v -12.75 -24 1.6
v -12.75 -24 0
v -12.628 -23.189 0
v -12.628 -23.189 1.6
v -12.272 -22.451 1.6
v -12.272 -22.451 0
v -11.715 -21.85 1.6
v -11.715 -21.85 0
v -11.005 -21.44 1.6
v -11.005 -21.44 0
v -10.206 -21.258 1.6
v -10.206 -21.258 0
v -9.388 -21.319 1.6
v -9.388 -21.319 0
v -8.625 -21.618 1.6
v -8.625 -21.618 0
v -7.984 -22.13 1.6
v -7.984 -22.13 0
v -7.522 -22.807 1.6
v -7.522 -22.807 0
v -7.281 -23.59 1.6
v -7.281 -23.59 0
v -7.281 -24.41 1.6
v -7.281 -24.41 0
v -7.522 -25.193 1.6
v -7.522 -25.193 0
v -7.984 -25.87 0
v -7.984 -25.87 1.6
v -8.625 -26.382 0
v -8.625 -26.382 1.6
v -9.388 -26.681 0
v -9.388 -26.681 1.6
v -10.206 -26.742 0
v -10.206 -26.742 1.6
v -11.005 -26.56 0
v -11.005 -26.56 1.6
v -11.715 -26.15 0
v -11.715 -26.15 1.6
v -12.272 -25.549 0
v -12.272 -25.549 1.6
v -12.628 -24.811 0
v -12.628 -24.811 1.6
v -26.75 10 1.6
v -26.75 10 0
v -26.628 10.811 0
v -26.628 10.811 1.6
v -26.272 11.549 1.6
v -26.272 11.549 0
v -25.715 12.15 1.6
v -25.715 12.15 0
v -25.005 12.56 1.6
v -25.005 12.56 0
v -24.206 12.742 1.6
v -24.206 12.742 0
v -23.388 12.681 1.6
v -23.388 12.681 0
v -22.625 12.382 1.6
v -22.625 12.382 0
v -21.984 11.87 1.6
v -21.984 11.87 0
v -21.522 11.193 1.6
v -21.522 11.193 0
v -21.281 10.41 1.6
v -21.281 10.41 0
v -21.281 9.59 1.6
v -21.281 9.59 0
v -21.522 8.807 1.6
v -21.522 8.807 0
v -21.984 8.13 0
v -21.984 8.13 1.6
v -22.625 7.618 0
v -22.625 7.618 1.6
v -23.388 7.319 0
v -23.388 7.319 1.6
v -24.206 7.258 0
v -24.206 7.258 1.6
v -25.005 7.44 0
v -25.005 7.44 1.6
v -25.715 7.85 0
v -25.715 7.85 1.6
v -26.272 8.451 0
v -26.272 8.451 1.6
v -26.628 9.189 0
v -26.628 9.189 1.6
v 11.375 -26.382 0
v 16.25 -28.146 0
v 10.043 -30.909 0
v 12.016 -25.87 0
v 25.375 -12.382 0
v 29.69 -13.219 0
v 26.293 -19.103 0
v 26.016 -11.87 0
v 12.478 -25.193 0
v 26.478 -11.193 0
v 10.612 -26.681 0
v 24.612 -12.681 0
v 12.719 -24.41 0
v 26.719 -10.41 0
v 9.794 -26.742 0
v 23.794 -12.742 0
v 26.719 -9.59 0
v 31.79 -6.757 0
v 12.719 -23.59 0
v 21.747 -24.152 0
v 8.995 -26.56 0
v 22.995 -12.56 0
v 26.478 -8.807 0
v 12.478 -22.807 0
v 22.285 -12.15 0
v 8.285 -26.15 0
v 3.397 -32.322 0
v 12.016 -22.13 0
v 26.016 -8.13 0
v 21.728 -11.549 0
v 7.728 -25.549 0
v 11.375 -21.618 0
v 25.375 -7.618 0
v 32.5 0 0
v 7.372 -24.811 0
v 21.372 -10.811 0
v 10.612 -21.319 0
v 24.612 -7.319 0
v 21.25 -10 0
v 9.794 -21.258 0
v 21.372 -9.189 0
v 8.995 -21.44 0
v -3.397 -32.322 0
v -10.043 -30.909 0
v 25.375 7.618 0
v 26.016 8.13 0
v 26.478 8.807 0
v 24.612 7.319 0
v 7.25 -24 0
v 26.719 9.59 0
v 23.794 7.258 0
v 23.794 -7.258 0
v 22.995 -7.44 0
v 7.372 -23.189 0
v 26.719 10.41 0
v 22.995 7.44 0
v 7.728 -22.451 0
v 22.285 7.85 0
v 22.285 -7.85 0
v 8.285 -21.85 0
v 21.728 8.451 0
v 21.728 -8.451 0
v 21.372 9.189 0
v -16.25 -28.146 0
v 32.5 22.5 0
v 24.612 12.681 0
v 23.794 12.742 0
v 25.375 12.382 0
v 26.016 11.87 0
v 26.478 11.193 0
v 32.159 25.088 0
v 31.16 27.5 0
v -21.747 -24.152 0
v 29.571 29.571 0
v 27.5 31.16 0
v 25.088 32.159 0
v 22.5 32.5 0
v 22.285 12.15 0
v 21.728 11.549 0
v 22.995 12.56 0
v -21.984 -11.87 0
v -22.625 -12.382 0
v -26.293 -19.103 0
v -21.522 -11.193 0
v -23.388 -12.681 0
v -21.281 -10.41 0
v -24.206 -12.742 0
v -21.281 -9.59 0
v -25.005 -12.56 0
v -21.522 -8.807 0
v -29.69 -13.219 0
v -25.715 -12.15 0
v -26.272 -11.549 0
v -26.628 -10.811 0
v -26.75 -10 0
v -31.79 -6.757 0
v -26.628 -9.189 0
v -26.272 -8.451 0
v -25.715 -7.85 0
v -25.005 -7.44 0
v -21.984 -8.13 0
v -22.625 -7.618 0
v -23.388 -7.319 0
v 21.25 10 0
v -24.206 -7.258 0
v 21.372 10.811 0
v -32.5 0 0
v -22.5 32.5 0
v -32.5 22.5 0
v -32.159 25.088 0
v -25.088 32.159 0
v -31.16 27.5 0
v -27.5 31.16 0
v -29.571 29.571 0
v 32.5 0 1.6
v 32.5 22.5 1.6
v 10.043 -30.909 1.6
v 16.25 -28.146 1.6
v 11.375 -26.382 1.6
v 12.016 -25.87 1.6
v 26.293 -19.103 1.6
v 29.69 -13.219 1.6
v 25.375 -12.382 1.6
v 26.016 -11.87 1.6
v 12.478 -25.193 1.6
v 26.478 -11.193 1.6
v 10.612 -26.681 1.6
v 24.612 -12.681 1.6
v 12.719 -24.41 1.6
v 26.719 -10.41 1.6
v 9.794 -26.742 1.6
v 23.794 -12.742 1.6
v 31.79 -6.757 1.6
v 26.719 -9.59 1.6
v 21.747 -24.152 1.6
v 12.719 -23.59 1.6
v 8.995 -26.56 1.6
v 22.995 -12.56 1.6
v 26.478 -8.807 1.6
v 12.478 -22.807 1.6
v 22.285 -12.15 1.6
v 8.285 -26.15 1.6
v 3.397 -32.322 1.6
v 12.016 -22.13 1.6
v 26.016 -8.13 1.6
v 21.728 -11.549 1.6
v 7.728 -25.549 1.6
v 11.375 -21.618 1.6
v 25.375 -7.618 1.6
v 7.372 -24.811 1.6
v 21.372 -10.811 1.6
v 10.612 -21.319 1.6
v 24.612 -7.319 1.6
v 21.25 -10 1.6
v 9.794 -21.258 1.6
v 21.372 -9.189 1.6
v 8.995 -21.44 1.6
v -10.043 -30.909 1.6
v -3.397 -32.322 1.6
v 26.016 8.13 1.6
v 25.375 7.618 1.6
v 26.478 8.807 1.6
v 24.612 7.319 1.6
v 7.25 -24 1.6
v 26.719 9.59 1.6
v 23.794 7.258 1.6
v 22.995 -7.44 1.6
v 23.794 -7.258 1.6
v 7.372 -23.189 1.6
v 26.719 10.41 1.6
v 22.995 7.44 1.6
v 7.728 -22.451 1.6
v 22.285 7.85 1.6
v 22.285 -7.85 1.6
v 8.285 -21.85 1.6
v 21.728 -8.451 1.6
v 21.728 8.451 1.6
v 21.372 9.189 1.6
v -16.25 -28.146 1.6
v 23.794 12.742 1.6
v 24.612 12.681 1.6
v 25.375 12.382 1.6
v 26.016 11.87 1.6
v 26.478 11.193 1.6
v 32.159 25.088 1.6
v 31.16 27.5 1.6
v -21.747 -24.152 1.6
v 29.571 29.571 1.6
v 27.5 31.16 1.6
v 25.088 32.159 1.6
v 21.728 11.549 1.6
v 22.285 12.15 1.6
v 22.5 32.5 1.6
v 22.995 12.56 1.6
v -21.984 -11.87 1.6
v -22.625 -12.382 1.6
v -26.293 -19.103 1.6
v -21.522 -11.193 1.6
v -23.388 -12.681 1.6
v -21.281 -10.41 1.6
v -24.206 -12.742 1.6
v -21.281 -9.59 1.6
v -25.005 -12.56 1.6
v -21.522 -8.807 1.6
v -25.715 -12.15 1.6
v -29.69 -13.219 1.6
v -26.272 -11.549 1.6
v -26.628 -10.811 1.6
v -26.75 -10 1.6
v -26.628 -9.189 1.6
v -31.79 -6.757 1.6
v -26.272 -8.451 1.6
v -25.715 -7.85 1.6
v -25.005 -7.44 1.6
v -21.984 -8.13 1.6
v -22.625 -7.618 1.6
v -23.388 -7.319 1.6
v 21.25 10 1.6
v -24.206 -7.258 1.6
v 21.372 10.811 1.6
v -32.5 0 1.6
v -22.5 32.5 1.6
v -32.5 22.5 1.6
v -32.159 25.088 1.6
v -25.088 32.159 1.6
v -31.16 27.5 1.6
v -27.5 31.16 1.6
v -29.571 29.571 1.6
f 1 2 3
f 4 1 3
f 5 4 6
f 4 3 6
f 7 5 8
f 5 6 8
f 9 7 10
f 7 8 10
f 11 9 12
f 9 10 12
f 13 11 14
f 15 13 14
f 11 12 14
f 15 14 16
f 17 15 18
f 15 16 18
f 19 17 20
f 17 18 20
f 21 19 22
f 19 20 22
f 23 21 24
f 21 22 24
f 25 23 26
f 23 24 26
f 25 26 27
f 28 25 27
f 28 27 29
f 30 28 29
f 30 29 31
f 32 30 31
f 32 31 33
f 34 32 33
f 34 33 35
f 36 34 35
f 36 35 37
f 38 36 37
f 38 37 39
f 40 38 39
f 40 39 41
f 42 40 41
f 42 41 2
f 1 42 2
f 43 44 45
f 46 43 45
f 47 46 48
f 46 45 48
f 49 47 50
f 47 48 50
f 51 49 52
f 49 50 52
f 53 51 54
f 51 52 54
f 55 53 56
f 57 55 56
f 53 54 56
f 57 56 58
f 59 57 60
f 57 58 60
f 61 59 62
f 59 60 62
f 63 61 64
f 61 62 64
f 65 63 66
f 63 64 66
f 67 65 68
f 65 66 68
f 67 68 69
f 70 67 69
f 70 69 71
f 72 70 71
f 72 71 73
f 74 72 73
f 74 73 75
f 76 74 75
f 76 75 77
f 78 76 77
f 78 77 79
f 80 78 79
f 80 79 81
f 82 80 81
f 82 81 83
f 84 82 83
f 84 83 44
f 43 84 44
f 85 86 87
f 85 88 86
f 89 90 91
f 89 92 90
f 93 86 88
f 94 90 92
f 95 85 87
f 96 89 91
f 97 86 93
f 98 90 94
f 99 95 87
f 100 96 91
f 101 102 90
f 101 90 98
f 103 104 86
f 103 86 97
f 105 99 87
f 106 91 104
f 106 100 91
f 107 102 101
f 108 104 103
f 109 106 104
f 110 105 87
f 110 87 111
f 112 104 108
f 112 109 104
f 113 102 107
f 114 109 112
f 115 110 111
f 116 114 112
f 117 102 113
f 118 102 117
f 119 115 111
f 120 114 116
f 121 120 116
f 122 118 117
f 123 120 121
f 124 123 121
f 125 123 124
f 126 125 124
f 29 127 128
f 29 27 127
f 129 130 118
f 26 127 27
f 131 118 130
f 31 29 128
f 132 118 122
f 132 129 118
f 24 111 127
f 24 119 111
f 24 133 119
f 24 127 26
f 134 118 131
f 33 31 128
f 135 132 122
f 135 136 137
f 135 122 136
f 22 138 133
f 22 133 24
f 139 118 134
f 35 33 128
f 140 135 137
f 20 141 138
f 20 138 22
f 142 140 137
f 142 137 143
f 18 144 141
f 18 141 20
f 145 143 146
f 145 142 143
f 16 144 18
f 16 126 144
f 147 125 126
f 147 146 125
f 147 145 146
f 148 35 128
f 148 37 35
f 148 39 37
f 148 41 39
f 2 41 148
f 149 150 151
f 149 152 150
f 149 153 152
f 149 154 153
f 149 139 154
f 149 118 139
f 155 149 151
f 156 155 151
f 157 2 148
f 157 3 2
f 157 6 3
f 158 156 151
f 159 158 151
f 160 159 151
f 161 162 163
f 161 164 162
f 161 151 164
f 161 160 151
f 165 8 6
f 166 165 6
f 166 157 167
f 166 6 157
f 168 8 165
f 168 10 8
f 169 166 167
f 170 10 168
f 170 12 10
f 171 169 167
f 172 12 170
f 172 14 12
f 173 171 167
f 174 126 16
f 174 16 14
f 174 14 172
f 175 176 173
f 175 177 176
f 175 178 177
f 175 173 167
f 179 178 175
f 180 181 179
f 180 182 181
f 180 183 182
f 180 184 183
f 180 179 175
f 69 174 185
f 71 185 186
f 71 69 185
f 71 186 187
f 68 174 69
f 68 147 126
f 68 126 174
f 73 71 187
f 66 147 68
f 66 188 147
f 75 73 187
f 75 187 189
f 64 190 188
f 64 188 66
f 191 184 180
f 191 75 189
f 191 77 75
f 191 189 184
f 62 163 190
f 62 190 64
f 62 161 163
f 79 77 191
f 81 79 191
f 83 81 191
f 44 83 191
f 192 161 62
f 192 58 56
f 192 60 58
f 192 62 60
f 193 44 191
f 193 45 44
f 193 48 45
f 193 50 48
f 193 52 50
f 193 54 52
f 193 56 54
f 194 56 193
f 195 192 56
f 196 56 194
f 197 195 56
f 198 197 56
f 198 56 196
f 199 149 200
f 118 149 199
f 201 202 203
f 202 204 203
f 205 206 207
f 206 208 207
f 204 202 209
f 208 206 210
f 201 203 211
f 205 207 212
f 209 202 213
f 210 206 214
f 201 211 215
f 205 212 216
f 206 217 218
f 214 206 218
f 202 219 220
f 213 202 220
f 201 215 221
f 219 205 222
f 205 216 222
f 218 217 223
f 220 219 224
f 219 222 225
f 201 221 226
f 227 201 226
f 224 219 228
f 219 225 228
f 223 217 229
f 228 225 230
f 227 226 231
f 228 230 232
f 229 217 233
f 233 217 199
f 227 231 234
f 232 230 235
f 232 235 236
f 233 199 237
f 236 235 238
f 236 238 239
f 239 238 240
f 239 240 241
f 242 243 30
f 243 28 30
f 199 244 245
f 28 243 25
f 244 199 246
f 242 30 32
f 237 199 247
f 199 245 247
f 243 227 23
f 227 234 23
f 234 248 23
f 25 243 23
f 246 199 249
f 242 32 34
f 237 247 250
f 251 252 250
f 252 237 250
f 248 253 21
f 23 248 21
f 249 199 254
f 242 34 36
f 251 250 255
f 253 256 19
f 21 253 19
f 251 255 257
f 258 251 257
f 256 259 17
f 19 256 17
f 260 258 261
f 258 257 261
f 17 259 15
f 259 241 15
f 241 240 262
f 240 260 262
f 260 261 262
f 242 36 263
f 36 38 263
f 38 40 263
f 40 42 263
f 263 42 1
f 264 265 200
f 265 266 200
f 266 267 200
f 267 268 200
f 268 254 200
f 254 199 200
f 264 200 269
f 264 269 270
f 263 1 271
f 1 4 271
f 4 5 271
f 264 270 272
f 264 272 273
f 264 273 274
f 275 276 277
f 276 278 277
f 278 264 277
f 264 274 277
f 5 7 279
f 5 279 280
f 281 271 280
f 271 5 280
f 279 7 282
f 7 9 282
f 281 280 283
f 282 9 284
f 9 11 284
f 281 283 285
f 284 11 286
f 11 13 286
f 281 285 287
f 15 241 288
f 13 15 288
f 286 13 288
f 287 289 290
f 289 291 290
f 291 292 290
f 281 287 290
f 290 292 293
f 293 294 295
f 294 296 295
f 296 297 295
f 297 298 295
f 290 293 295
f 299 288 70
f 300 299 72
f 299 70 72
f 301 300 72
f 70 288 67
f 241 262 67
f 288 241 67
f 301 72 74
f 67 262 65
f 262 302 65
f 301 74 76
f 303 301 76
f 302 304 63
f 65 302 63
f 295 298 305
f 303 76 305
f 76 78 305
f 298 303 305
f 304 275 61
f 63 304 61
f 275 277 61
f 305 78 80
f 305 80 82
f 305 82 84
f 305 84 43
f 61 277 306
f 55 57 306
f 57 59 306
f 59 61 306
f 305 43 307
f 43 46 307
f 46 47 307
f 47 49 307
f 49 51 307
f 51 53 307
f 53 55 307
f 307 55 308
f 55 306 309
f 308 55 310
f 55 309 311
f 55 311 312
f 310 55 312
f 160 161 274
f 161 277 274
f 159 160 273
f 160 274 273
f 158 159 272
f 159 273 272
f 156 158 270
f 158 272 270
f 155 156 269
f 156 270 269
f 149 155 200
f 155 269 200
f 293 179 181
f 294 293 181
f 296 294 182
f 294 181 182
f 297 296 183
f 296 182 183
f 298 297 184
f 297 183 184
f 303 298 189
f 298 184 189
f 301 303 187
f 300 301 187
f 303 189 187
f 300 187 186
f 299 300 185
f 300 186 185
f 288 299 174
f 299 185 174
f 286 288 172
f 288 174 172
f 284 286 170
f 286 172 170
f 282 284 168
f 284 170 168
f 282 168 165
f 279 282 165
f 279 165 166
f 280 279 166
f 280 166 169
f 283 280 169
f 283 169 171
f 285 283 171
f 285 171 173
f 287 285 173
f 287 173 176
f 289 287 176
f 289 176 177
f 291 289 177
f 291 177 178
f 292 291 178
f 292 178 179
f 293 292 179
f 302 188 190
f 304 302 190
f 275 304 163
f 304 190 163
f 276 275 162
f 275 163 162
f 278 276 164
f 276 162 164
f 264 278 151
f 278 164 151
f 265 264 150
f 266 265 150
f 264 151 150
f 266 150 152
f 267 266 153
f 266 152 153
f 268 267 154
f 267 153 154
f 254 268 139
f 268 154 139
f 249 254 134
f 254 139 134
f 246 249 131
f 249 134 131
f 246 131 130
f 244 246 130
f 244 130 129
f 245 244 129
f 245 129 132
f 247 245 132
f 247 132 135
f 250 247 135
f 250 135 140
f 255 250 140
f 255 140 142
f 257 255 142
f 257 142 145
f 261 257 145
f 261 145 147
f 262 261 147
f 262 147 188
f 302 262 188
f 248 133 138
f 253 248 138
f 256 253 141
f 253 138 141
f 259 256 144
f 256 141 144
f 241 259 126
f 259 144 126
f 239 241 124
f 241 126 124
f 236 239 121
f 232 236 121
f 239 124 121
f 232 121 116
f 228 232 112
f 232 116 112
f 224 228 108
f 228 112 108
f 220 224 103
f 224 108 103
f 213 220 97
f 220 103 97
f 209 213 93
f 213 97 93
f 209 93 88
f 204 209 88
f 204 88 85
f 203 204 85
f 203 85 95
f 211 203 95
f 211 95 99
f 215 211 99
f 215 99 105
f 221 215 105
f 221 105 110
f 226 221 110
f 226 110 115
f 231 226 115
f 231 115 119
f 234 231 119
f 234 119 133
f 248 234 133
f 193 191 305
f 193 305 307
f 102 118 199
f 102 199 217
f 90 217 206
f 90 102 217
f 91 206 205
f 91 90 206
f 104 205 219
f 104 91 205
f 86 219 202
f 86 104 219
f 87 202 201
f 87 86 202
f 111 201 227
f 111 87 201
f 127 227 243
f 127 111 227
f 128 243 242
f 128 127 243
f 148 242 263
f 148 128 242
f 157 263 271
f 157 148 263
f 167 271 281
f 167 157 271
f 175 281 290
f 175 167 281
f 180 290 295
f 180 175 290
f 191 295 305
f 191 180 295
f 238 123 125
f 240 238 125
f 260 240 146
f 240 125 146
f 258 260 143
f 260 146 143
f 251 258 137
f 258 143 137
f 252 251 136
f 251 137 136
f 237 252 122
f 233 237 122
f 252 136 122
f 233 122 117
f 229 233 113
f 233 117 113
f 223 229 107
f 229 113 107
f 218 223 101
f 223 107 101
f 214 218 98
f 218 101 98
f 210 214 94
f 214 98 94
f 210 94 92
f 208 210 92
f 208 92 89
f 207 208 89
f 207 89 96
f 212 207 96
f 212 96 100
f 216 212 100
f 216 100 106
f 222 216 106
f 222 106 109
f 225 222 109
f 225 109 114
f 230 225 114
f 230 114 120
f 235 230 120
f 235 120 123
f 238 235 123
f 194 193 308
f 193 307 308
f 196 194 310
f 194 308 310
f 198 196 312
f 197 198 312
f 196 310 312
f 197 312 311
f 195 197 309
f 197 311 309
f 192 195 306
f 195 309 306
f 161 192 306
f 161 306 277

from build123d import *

# Parameters (mm, degrees)
BOSS_EXTRUDE1_DEPTH  = 1.6002
M5_CLEARANCE_HOLE1_D = 5.5
FILLET1_R            = 10


with BuildPart() as part:
    # Sketch1 → Boss-Extrude1 (new body)
    with BuildSketch(Plane.XY):
        with BuildLine():
            Line((-32.5, 0), (-32.5, 32.5))
            Line((-32.5, 32.5), (32.5, 32.5))
            Line((32.5, 32.5), (32.5, 0))
            ThreePointArc((32.5, 0), (0, -32.5), (-32.5, 0))
        make_face()
    extrude(amount=BOSS_EXTRUDE1_DEPTH)

    # M5 Clearance Hole1 (through all)
    with Locations(Plane.XY.offset(1.6002)):
        with Locations((24, -10), (10, -24), (-10, -24), (-24, -10), (-24, 10), (24, 10)):
            Hole(M5_CLEARANCE_HOLE1_D / 2)

    # Fillet1
    fillet1_edges = [part.edges().sort_by_distance(p)[0] for p in [
        (-32.5, 32.5, 0.8001),
        (32.5, 32.5, 0.8001),
    ]]
    fillet(fillet1_edges, radius=FILLET1_R)


solid = part.part
